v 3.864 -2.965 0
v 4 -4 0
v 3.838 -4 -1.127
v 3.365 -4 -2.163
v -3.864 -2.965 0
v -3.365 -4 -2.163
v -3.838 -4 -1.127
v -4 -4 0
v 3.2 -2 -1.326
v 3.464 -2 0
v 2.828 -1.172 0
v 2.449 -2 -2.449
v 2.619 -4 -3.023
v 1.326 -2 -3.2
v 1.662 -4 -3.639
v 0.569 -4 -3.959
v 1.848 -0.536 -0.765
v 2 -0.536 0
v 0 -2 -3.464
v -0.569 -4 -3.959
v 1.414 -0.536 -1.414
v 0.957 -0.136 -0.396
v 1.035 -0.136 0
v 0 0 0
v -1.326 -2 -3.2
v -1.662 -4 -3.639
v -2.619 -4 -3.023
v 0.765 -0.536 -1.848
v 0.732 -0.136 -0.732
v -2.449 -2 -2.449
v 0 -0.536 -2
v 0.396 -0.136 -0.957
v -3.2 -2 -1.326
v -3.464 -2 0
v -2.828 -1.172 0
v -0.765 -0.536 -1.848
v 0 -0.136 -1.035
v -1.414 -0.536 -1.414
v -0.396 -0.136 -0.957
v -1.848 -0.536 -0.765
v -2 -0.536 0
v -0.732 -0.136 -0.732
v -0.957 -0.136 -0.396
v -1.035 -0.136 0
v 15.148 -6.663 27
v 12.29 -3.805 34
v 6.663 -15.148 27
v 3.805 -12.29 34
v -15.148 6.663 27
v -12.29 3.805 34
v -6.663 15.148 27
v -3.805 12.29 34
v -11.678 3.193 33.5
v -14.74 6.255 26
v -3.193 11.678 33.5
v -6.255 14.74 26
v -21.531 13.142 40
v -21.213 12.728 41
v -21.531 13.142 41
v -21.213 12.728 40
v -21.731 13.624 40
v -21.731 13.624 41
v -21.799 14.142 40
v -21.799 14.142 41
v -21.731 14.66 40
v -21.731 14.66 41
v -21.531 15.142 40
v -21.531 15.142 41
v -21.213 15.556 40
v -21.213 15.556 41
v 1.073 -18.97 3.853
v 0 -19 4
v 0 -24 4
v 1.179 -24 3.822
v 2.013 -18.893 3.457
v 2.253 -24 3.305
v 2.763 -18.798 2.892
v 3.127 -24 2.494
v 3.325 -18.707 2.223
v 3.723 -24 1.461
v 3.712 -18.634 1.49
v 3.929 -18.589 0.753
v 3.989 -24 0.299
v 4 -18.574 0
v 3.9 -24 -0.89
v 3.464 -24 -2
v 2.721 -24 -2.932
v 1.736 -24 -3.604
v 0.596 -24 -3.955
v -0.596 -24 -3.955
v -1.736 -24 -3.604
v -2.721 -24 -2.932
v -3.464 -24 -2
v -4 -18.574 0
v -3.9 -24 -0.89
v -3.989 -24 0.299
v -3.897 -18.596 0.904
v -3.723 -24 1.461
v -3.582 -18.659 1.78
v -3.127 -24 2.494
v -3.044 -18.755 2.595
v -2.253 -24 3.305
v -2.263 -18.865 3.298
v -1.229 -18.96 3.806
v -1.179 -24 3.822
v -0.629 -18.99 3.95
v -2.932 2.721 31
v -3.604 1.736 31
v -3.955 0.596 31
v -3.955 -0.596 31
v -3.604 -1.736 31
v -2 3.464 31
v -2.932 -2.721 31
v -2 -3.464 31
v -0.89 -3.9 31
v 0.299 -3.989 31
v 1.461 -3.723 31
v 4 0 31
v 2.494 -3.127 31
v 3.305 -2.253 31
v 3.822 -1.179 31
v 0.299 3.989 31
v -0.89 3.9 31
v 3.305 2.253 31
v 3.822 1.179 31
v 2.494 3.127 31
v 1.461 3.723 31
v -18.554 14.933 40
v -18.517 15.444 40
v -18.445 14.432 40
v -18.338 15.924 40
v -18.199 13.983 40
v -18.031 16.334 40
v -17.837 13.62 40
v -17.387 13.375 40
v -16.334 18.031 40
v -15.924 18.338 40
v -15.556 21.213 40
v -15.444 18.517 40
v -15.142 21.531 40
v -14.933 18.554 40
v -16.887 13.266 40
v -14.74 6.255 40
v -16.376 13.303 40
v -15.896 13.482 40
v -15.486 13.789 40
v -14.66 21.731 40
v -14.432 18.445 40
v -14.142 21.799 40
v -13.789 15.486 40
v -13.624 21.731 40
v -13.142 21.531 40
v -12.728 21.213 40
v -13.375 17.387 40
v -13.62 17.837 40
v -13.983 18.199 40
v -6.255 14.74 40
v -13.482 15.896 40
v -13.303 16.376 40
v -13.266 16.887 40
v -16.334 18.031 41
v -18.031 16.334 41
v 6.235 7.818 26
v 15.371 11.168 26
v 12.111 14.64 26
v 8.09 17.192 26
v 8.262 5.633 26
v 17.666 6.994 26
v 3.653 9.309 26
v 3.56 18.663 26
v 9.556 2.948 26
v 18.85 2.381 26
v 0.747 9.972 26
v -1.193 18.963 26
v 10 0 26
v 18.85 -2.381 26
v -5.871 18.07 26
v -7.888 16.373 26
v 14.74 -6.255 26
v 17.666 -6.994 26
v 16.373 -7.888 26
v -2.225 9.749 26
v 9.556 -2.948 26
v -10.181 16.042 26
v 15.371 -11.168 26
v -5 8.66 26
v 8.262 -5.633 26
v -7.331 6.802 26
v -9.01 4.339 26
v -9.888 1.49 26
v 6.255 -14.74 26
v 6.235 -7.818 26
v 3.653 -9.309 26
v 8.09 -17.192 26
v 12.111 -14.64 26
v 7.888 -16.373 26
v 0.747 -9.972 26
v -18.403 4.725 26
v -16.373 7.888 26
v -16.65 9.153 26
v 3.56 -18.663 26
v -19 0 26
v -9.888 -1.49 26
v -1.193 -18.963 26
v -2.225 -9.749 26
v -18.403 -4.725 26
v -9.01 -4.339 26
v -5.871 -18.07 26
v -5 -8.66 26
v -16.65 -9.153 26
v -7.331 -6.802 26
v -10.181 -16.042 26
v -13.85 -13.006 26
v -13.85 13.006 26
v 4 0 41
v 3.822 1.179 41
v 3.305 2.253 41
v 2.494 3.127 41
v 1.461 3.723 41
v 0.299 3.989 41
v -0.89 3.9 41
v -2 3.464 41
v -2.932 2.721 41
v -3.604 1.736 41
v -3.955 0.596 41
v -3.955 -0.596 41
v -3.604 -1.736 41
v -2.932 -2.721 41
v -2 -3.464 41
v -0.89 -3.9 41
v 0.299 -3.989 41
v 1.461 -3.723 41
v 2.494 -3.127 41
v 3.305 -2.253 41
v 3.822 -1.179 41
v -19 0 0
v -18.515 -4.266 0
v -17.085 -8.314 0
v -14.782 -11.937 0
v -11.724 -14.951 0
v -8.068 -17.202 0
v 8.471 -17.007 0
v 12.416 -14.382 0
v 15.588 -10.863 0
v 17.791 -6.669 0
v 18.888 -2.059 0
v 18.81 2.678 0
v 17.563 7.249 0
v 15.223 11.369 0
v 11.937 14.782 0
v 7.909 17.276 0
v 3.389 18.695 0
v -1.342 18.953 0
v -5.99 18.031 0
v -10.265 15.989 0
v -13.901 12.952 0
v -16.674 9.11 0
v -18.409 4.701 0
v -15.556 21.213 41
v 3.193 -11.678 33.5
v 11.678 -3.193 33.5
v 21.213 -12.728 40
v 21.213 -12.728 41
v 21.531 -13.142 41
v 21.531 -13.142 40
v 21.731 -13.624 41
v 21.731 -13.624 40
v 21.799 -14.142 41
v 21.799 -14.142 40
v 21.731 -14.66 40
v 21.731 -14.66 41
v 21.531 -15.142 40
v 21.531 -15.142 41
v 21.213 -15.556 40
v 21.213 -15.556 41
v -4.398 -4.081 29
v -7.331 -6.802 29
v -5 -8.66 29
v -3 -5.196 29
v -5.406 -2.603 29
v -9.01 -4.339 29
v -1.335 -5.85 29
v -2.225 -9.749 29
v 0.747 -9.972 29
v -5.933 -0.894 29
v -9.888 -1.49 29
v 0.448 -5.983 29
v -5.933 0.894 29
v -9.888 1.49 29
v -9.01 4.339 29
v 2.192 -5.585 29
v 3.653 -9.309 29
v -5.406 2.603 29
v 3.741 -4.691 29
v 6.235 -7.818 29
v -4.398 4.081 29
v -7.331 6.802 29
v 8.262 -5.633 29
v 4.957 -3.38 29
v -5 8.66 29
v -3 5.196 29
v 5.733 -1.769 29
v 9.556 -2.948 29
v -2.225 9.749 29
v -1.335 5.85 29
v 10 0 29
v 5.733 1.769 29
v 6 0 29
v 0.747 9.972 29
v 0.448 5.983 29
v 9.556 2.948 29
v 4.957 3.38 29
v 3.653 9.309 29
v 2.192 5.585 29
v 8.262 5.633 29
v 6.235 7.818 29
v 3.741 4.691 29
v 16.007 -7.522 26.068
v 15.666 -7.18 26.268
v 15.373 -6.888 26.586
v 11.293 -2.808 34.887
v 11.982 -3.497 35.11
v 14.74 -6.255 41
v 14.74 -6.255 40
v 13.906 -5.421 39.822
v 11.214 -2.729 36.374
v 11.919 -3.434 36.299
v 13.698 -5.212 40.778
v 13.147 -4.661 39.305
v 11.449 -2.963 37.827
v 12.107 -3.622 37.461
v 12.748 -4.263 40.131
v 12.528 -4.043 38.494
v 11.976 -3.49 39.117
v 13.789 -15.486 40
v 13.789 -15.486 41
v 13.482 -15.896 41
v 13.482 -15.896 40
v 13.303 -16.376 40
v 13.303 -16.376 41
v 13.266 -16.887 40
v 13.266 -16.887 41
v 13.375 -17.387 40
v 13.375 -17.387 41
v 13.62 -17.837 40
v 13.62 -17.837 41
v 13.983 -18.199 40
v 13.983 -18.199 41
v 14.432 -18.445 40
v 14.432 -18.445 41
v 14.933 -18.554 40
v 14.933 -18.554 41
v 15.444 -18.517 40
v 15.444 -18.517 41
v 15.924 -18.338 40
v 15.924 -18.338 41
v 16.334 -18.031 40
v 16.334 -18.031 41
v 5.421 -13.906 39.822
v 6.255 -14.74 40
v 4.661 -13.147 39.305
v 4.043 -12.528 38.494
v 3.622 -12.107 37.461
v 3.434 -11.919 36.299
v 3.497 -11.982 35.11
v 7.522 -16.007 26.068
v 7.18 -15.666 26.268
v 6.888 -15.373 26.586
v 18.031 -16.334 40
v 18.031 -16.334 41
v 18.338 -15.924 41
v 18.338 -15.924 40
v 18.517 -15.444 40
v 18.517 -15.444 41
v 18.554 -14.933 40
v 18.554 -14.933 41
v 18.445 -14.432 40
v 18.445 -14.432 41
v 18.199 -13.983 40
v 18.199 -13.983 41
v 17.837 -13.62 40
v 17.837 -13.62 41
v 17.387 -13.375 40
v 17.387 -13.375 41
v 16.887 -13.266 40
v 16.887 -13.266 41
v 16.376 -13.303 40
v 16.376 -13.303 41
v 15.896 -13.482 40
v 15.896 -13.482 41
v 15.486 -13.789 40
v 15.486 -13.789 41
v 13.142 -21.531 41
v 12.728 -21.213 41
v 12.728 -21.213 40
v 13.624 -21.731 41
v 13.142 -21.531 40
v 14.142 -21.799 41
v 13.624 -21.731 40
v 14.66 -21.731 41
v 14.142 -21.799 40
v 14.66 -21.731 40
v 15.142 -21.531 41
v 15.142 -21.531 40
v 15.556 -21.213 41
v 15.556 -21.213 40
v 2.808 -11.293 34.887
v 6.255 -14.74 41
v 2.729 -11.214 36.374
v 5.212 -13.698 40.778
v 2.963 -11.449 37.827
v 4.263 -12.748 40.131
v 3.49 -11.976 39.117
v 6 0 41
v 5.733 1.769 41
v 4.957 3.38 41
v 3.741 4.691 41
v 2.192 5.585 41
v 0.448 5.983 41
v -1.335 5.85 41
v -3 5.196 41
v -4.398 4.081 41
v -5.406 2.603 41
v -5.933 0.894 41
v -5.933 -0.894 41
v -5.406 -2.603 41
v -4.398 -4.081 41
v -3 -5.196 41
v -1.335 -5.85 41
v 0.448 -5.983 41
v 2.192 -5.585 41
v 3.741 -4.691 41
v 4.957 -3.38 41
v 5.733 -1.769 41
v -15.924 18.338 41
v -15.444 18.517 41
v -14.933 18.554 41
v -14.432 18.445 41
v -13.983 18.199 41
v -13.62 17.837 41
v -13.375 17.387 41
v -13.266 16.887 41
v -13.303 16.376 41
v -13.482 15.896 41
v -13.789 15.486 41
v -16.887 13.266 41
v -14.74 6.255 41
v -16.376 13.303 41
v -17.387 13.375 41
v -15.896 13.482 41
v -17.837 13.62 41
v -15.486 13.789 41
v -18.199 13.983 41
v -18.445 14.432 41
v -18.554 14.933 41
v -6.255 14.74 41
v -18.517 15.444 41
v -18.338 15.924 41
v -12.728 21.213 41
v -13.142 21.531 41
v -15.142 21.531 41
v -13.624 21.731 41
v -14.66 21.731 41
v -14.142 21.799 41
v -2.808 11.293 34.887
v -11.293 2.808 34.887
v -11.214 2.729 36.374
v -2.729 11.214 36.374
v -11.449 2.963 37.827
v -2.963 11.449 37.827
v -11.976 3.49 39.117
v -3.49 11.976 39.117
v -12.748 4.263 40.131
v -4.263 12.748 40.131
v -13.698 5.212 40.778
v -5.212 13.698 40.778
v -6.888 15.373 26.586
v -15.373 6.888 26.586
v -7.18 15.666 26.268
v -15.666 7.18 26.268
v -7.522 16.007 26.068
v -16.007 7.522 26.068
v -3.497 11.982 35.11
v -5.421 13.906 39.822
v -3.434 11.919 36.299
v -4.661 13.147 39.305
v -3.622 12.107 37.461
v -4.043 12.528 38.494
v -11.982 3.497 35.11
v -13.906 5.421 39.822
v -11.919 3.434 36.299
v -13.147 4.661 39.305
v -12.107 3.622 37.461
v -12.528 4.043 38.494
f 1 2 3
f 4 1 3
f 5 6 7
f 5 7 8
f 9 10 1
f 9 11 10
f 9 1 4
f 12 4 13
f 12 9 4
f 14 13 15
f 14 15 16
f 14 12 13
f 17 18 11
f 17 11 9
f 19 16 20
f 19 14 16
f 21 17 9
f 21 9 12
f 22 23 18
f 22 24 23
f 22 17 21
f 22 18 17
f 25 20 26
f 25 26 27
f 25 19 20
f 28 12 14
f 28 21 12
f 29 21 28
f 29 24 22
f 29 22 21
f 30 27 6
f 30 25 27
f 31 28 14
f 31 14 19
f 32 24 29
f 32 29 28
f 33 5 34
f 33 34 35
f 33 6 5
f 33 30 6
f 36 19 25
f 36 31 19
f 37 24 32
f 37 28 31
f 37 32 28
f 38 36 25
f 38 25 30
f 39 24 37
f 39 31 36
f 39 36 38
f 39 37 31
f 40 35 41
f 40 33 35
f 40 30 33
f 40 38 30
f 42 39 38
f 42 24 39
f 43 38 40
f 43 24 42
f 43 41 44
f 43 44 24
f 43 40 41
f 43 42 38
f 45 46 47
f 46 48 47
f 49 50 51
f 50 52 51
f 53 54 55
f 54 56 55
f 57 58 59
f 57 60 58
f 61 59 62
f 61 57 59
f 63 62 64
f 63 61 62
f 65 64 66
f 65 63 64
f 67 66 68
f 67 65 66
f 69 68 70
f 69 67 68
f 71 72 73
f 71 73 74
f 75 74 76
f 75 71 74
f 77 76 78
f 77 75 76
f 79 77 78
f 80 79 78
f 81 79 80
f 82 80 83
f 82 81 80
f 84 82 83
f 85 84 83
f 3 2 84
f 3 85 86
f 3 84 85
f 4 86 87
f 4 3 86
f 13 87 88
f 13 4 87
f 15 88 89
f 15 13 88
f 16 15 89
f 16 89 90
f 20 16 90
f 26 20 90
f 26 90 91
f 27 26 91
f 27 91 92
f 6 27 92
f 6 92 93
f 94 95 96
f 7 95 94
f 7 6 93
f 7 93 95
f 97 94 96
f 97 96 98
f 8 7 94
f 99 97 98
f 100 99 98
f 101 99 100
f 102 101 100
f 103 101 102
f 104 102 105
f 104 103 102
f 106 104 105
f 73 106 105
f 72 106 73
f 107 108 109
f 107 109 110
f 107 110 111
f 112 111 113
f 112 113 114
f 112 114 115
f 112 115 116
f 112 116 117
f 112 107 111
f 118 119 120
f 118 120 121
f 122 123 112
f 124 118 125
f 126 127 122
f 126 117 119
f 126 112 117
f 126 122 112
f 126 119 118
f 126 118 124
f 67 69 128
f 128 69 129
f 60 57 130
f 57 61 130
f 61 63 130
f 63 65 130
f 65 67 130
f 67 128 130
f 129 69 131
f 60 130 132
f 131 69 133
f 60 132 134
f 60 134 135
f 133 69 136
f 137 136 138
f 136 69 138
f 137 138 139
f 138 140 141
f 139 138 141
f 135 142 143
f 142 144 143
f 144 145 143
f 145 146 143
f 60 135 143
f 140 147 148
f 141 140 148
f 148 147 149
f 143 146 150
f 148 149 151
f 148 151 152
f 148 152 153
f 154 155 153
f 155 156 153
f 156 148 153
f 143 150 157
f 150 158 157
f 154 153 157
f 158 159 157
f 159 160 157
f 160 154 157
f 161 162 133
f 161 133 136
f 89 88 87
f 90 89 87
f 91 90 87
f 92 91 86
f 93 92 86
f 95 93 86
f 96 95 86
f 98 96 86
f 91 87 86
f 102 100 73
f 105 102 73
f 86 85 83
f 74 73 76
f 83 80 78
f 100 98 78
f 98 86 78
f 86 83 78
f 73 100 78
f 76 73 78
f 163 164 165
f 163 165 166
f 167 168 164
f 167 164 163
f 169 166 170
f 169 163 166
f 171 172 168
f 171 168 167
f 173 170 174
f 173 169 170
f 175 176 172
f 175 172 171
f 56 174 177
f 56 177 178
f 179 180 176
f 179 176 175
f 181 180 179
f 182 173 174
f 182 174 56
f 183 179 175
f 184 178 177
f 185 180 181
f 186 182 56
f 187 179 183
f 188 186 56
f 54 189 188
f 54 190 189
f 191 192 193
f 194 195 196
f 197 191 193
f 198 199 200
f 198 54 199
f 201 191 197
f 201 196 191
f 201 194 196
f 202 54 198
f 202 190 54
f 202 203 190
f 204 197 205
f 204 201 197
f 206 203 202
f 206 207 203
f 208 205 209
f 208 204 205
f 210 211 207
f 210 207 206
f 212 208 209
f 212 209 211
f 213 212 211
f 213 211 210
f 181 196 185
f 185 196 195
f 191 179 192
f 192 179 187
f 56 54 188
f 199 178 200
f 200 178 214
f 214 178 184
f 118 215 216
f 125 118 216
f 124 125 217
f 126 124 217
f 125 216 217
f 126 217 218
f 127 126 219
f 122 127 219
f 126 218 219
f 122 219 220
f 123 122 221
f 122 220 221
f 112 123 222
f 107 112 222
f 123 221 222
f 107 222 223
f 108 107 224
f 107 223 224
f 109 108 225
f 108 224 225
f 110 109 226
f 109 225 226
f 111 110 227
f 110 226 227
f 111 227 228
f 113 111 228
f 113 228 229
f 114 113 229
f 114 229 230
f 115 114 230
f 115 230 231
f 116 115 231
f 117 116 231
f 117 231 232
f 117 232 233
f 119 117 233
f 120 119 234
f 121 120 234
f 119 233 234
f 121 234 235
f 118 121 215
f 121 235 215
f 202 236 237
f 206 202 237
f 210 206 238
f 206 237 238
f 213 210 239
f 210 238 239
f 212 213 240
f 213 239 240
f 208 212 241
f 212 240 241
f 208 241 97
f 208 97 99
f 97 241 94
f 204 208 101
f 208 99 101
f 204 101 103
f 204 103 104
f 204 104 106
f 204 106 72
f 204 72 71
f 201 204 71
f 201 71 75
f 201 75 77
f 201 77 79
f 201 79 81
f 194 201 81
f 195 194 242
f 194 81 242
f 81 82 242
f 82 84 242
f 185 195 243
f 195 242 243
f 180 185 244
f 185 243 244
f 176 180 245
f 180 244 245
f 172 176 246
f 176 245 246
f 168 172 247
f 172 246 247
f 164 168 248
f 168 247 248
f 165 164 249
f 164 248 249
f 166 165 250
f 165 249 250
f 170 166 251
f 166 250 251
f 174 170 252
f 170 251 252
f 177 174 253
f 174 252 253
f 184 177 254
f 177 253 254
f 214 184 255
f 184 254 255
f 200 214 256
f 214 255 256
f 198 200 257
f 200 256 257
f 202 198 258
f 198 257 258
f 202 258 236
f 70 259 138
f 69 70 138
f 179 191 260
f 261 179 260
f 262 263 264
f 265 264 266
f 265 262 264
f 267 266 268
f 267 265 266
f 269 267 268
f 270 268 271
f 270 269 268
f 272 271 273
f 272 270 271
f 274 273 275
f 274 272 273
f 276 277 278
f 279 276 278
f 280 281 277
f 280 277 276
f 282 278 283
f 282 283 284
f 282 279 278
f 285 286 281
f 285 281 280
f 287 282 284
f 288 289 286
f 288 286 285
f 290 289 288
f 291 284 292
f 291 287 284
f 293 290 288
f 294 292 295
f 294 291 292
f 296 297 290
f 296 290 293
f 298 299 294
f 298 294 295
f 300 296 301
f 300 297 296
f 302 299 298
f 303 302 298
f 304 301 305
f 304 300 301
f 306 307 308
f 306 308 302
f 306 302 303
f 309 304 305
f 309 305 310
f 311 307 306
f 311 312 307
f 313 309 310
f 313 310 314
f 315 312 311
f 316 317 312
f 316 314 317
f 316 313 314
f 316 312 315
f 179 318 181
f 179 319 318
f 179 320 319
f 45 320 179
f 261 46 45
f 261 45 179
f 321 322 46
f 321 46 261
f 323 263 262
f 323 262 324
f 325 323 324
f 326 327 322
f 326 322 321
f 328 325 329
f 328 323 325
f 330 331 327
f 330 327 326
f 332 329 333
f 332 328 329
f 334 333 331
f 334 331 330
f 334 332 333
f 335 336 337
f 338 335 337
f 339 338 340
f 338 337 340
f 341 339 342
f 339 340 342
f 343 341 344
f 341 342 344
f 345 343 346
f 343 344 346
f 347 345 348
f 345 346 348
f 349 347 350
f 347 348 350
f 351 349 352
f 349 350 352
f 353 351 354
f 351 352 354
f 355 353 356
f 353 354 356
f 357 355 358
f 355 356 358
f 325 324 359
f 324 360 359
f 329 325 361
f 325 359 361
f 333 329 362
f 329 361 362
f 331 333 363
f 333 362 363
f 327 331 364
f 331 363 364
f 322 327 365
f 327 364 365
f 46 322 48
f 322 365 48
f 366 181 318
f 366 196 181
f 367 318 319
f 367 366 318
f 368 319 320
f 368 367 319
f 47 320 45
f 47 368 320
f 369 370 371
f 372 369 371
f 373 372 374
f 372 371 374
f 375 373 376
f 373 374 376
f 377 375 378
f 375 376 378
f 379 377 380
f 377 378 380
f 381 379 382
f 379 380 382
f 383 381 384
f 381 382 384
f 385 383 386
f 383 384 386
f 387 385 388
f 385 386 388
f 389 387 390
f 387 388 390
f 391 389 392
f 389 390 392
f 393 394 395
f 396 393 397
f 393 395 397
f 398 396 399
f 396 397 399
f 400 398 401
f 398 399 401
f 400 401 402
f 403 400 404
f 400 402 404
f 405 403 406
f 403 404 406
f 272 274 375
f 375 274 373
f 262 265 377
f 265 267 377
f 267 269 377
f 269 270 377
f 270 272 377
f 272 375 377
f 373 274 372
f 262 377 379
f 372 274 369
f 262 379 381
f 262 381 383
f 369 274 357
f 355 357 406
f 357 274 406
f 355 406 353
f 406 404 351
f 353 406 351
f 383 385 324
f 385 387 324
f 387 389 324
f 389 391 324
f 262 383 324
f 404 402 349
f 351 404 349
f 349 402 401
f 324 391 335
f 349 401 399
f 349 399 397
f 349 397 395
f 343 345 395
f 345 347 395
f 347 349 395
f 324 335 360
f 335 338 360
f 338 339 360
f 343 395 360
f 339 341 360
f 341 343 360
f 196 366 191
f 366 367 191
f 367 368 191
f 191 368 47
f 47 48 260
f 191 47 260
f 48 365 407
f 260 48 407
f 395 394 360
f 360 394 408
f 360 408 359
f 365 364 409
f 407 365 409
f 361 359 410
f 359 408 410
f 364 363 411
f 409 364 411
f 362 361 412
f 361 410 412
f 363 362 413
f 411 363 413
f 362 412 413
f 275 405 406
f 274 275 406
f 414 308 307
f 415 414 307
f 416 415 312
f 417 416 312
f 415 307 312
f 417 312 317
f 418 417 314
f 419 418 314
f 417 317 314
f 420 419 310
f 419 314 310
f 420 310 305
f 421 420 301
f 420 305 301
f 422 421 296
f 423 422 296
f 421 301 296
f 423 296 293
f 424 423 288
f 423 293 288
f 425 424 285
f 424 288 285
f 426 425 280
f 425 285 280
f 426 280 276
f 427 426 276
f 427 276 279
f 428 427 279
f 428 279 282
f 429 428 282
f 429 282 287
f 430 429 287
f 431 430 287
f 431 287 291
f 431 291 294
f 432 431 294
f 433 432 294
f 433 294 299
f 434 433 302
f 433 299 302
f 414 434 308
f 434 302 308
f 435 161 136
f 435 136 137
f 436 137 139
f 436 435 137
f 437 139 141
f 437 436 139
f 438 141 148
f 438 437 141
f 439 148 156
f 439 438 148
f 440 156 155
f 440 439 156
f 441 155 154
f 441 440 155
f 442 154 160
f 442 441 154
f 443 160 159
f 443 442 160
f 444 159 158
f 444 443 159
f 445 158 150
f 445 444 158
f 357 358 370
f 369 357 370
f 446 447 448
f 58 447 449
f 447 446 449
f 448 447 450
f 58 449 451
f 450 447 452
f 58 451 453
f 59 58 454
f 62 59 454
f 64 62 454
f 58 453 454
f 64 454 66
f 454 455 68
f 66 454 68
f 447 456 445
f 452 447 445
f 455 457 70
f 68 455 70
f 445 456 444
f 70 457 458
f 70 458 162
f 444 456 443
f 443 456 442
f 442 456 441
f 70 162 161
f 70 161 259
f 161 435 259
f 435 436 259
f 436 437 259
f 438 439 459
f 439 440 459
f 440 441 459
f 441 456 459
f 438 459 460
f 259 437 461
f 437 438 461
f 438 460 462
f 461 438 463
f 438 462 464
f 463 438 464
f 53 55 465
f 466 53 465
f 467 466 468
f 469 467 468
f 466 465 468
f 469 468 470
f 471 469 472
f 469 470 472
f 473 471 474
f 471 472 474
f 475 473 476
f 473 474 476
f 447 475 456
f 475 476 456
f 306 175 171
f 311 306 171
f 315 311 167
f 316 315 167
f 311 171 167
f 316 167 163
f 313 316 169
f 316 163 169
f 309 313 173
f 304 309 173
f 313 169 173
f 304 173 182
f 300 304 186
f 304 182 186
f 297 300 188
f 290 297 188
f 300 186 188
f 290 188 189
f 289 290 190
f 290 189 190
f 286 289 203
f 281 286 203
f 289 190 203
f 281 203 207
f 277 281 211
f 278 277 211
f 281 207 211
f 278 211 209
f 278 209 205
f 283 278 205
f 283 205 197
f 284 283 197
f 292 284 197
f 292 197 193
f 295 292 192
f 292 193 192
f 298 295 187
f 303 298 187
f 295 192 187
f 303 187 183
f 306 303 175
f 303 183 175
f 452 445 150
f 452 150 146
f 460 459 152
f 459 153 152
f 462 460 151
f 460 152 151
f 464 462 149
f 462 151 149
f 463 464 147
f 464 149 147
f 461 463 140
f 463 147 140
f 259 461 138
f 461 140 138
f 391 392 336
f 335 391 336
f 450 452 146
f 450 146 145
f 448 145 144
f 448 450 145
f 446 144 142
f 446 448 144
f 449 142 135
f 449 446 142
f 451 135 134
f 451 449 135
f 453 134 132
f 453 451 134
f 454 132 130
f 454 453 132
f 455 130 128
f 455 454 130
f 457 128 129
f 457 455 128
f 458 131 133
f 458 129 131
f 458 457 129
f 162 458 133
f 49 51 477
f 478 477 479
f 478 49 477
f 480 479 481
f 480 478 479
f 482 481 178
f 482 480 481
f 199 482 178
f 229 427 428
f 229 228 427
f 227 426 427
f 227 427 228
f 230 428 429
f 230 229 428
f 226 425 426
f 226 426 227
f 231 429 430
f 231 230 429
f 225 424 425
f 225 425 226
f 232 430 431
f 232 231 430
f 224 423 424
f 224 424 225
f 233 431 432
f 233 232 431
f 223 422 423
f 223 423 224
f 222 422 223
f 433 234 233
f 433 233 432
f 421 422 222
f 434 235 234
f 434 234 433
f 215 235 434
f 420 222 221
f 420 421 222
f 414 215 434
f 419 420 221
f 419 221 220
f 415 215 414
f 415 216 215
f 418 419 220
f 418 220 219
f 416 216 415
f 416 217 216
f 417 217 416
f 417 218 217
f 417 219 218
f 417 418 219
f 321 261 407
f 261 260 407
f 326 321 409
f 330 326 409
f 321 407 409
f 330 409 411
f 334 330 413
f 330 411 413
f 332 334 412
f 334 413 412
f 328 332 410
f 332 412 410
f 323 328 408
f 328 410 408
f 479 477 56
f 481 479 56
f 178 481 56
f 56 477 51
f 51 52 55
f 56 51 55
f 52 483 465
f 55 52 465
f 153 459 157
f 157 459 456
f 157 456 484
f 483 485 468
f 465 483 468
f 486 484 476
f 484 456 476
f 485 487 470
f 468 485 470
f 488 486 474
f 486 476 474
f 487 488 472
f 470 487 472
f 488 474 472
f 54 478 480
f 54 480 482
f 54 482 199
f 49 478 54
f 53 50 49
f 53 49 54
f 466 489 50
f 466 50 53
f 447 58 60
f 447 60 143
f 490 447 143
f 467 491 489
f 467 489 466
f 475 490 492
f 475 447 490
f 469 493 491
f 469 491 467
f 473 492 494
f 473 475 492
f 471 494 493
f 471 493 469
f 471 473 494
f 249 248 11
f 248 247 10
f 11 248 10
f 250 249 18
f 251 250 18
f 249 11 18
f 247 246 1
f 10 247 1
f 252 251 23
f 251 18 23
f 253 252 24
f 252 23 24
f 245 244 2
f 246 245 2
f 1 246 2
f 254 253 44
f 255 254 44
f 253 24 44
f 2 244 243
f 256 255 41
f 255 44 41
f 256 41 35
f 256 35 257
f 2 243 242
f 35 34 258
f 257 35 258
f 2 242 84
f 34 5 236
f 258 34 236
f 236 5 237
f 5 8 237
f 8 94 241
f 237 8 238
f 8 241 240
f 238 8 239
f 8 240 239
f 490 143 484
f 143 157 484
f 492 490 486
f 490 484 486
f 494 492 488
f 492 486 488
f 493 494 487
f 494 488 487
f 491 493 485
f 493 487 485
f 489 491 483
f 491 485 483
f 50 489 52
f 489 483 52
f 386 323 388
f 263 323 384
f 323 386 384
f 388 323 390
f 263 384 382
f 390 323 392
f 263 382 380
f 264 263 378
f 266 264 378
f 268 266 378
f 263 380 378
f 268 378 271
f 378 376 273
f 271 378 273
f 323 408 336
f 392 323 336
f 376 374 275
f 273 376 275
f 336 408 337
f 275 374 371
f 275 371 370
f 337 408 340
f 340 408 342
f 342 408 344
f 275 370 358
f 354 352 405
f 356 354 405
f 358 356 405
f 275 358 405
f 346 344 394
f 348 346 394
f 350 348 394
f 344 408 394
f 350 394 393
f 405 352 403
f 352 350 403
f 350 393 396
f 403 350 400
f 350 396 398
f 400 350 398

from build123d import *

# Parameters (mm, degrees)
SKETCH1_R           = 19
BOSS_EXTRUDE1_DEPTH = 26
SKETCH2_R           = 10
BOSS_EXTRUDE2_DEPTH = 3
SKETCH3_R           = 6
BOSS_EXTRUDE3_DEPTH = 12
SKETCH4_R           = 4
CUT_EXTRUDE1_DEPTH  = 10
SKETCH5_R           = 4
BOSS_EXTRUDE4_DEPTH = 24
FILLET1_R           = 4
BOSS_EXTRUDE5_DEPTH = 6
CUT_EXTRUDE2_REACH  = 57.794
FILLET2_R           = 2
FILLET3_R           = 2


with BuildPart() as part:
    # Sketch1 → Boss-Extrude1 (new body)
    with BuildSketch(Plane.XY):
        with Locations(Location((0, 0, 0), (0, 0, 180))):
            Circle(SKETCH1_R)
    extrude(amount=BOSS_EXTRUDE1_DEPTH)

    # Sketch2 → Boss-Extrude2 (add)
    with BuildSketch(Plane.XY.offset(26)):
        Circle(SKETCH2_R)
    extrude(amount=BOSS_EXTRUDE2_DEPTH)

    # Sketch3 → Boss-Extrude3 (add)
    with BuildSketch(Plane.XY.offset(29)):
        Circle(SKETCH3_R)
    extrude(amount=BOSS_EXTRUDE3_DEPTH)

    # Sketch4 → Cut-Extrude1 (cut)
    with BuildSketch(Plane.XY.offset(41)):
        Circle(SKETCH4_R)
    extrude(amount=-CUT_EXTRUDE1_DEPTH, mode=Mode.SUBTRACT)

    # Sketch5 → Boss-Extrude4 (add)
    with BuildSketch(Plane(origin=(0, 0, 0), x_dir=(1, 0, 0), z_dir=(0, 1, 0))):
        with Locations(Location((0, 0, 0), (0, 0, 270))):
            Circle(SKETCH5_R)
    extrude(amount=-BOSS_EXTRUDE4_DEPTH)

    # Fillet1
    fillet1_edges = [part.edges().sort_by_distance(p)[0] for p in [
        (0, 0, -4),
    ]]
    fillet(fillet1_edges, radius=FILLET1_R - 0.0001)  # a hair under: the kernel refuses the full size

    # Sketch6 → Boss-Extrude5 (add, symmetric)
    with BuildSketch(Plane(origin=(0, 0, 0), x_dir=(-0.7071067811865464, 0.7071067811865488, 0), z_dir=(0.7071067811865488, 0.7071067811865464, 0))):
        with BuildLine():
            Line((-14.845299462, 26), (-10.515172443, 33.5))
            ThreePointArc((-10.515172443, 33.5), (-10.515172443, 38.5), (-14.845299462, 41))
            Line((-14.845299462, 41), (-26, 41))
            Line((-26, 41), (-26, 40))
            Line((-26, 40), (-14.845299462, 40))
            ThreePointArc((-14.845299462, 40), (-11.381197846, 38), (-11.381197846, 34))
            Line((-11.381197846, 34), (-16, 26))
            Line((-16, 26), (-14.845299462, 26))
        make_face()
        with BuildLine():
            Line((26, 41), (26, 40))
            Line((26, 40), (14.845299462, 40))
            ThreePointArc((14.845299462, 40), (11.381197846, 38), (11.381197846, 34))
            Line((11.381197846, 34), (16, 26))
            Line((16, 26), (14.845299462, 26))
            Line((14.845299462, 26), (10.515172443, 33.5))
            ThreePointArc((10.515172443, 33.5), (10.515172443, 38.5), (14.845299462, 41))
            Line((14.845299462, 41), (26, 41))
        make_face()
    extrude(amount=BOSS_EXTRUDE5_DEPTH, both=True)

    # Sketch7 → Cut-Extrude2 (cut, up to next)
    with BuildSketch(Plane.XY.offset(41), mode=Mode.PRIVATE) as cut_extrude2_sk1:
        with BuildLine():
            Line((-18.03122292, 16.334166645), (-16.334166645, 18.03122292))
            ThreePointArc((-16.334166645, 18.03122292), (-13.788582233, 18.03122292), (-13.788582233, 15.485638508))
            Line((-13.788582233, 15.485638508), (-15.485638508, 13.788582233))
            ThreePointArc((-15.485638508, 13.788582233), (-18.03122292, 13.788582233), (-18.03122292, 16.334166645))
        make_face()
    cut_extrude2_tool1 = extrude(cut_extrude2_sk1.sketch, amount=-CUT_EXTRUDE2_REACH, mode=Mode.PRIVATE) & part.part
    # Sketch7 → Cut-Extrude2 (cut, up to next)
    with BuildSketch(Plane.XY.offset(41), mode=Mode.PRIVATE) as cut_extrude2_sk2:
        with BuildLine():
            Line((15.485638508, -13.788582233), (13.788582233, -15.485638508))
            ThreePointArc((13.788582233, -15.485638508), (13.788582233, -18.03122292), (16.334166645, -18.03122292))
            Line((16.334166645, -18.03122292), (18.03122292, -16.334166645))
            ThreePointArc((18.03122292, -16.334166645), (18.03122292, -13.788582233), (15.485638508, -13.788582233))
        make_face()
    cut_extrude2_tool2 = extrude(cut_extrude2_sk2.sketch, amount=-CUT_EXTRUDE2_REACH, mode=Mode.PRIVATE) & part.part
    add(cut_extrude2_tool1.solids().sort_by_distance((-15.909903, 15.909903, 41))[0], mode=Mode.SUBTRACT)
    add(cut_extrude2_tool2.solids().sort_by_distance((15.909903, -15.909903, 41))[0], mode=Mode.SUBTRACT)

    # Fillet2
    fillet2_edges = [part.edges().sort_by_distance(p)[0] for p in [
        (14.142135624, -22.627416998, 40.5),
        (22.627416998, -14.142135624, 40.5),
        (-22.627416998, 14.142135624, 40.5),
        (-14.142135624, 22.627416998, 40.5),
    ]]
    fillet(fillet2_edges, radius=FILLET2_R)

    # Fillet3
    fillet3_edges = [part.edges().sort_by_distance(p)[0] for p in [
        (11.313708499, -11.313708499, 26),
        (-11.313708499, 11.313708499, 26),
    ]]
    fillet(fillet3_edges, radius=FILLET3_R)


solid = part.part
